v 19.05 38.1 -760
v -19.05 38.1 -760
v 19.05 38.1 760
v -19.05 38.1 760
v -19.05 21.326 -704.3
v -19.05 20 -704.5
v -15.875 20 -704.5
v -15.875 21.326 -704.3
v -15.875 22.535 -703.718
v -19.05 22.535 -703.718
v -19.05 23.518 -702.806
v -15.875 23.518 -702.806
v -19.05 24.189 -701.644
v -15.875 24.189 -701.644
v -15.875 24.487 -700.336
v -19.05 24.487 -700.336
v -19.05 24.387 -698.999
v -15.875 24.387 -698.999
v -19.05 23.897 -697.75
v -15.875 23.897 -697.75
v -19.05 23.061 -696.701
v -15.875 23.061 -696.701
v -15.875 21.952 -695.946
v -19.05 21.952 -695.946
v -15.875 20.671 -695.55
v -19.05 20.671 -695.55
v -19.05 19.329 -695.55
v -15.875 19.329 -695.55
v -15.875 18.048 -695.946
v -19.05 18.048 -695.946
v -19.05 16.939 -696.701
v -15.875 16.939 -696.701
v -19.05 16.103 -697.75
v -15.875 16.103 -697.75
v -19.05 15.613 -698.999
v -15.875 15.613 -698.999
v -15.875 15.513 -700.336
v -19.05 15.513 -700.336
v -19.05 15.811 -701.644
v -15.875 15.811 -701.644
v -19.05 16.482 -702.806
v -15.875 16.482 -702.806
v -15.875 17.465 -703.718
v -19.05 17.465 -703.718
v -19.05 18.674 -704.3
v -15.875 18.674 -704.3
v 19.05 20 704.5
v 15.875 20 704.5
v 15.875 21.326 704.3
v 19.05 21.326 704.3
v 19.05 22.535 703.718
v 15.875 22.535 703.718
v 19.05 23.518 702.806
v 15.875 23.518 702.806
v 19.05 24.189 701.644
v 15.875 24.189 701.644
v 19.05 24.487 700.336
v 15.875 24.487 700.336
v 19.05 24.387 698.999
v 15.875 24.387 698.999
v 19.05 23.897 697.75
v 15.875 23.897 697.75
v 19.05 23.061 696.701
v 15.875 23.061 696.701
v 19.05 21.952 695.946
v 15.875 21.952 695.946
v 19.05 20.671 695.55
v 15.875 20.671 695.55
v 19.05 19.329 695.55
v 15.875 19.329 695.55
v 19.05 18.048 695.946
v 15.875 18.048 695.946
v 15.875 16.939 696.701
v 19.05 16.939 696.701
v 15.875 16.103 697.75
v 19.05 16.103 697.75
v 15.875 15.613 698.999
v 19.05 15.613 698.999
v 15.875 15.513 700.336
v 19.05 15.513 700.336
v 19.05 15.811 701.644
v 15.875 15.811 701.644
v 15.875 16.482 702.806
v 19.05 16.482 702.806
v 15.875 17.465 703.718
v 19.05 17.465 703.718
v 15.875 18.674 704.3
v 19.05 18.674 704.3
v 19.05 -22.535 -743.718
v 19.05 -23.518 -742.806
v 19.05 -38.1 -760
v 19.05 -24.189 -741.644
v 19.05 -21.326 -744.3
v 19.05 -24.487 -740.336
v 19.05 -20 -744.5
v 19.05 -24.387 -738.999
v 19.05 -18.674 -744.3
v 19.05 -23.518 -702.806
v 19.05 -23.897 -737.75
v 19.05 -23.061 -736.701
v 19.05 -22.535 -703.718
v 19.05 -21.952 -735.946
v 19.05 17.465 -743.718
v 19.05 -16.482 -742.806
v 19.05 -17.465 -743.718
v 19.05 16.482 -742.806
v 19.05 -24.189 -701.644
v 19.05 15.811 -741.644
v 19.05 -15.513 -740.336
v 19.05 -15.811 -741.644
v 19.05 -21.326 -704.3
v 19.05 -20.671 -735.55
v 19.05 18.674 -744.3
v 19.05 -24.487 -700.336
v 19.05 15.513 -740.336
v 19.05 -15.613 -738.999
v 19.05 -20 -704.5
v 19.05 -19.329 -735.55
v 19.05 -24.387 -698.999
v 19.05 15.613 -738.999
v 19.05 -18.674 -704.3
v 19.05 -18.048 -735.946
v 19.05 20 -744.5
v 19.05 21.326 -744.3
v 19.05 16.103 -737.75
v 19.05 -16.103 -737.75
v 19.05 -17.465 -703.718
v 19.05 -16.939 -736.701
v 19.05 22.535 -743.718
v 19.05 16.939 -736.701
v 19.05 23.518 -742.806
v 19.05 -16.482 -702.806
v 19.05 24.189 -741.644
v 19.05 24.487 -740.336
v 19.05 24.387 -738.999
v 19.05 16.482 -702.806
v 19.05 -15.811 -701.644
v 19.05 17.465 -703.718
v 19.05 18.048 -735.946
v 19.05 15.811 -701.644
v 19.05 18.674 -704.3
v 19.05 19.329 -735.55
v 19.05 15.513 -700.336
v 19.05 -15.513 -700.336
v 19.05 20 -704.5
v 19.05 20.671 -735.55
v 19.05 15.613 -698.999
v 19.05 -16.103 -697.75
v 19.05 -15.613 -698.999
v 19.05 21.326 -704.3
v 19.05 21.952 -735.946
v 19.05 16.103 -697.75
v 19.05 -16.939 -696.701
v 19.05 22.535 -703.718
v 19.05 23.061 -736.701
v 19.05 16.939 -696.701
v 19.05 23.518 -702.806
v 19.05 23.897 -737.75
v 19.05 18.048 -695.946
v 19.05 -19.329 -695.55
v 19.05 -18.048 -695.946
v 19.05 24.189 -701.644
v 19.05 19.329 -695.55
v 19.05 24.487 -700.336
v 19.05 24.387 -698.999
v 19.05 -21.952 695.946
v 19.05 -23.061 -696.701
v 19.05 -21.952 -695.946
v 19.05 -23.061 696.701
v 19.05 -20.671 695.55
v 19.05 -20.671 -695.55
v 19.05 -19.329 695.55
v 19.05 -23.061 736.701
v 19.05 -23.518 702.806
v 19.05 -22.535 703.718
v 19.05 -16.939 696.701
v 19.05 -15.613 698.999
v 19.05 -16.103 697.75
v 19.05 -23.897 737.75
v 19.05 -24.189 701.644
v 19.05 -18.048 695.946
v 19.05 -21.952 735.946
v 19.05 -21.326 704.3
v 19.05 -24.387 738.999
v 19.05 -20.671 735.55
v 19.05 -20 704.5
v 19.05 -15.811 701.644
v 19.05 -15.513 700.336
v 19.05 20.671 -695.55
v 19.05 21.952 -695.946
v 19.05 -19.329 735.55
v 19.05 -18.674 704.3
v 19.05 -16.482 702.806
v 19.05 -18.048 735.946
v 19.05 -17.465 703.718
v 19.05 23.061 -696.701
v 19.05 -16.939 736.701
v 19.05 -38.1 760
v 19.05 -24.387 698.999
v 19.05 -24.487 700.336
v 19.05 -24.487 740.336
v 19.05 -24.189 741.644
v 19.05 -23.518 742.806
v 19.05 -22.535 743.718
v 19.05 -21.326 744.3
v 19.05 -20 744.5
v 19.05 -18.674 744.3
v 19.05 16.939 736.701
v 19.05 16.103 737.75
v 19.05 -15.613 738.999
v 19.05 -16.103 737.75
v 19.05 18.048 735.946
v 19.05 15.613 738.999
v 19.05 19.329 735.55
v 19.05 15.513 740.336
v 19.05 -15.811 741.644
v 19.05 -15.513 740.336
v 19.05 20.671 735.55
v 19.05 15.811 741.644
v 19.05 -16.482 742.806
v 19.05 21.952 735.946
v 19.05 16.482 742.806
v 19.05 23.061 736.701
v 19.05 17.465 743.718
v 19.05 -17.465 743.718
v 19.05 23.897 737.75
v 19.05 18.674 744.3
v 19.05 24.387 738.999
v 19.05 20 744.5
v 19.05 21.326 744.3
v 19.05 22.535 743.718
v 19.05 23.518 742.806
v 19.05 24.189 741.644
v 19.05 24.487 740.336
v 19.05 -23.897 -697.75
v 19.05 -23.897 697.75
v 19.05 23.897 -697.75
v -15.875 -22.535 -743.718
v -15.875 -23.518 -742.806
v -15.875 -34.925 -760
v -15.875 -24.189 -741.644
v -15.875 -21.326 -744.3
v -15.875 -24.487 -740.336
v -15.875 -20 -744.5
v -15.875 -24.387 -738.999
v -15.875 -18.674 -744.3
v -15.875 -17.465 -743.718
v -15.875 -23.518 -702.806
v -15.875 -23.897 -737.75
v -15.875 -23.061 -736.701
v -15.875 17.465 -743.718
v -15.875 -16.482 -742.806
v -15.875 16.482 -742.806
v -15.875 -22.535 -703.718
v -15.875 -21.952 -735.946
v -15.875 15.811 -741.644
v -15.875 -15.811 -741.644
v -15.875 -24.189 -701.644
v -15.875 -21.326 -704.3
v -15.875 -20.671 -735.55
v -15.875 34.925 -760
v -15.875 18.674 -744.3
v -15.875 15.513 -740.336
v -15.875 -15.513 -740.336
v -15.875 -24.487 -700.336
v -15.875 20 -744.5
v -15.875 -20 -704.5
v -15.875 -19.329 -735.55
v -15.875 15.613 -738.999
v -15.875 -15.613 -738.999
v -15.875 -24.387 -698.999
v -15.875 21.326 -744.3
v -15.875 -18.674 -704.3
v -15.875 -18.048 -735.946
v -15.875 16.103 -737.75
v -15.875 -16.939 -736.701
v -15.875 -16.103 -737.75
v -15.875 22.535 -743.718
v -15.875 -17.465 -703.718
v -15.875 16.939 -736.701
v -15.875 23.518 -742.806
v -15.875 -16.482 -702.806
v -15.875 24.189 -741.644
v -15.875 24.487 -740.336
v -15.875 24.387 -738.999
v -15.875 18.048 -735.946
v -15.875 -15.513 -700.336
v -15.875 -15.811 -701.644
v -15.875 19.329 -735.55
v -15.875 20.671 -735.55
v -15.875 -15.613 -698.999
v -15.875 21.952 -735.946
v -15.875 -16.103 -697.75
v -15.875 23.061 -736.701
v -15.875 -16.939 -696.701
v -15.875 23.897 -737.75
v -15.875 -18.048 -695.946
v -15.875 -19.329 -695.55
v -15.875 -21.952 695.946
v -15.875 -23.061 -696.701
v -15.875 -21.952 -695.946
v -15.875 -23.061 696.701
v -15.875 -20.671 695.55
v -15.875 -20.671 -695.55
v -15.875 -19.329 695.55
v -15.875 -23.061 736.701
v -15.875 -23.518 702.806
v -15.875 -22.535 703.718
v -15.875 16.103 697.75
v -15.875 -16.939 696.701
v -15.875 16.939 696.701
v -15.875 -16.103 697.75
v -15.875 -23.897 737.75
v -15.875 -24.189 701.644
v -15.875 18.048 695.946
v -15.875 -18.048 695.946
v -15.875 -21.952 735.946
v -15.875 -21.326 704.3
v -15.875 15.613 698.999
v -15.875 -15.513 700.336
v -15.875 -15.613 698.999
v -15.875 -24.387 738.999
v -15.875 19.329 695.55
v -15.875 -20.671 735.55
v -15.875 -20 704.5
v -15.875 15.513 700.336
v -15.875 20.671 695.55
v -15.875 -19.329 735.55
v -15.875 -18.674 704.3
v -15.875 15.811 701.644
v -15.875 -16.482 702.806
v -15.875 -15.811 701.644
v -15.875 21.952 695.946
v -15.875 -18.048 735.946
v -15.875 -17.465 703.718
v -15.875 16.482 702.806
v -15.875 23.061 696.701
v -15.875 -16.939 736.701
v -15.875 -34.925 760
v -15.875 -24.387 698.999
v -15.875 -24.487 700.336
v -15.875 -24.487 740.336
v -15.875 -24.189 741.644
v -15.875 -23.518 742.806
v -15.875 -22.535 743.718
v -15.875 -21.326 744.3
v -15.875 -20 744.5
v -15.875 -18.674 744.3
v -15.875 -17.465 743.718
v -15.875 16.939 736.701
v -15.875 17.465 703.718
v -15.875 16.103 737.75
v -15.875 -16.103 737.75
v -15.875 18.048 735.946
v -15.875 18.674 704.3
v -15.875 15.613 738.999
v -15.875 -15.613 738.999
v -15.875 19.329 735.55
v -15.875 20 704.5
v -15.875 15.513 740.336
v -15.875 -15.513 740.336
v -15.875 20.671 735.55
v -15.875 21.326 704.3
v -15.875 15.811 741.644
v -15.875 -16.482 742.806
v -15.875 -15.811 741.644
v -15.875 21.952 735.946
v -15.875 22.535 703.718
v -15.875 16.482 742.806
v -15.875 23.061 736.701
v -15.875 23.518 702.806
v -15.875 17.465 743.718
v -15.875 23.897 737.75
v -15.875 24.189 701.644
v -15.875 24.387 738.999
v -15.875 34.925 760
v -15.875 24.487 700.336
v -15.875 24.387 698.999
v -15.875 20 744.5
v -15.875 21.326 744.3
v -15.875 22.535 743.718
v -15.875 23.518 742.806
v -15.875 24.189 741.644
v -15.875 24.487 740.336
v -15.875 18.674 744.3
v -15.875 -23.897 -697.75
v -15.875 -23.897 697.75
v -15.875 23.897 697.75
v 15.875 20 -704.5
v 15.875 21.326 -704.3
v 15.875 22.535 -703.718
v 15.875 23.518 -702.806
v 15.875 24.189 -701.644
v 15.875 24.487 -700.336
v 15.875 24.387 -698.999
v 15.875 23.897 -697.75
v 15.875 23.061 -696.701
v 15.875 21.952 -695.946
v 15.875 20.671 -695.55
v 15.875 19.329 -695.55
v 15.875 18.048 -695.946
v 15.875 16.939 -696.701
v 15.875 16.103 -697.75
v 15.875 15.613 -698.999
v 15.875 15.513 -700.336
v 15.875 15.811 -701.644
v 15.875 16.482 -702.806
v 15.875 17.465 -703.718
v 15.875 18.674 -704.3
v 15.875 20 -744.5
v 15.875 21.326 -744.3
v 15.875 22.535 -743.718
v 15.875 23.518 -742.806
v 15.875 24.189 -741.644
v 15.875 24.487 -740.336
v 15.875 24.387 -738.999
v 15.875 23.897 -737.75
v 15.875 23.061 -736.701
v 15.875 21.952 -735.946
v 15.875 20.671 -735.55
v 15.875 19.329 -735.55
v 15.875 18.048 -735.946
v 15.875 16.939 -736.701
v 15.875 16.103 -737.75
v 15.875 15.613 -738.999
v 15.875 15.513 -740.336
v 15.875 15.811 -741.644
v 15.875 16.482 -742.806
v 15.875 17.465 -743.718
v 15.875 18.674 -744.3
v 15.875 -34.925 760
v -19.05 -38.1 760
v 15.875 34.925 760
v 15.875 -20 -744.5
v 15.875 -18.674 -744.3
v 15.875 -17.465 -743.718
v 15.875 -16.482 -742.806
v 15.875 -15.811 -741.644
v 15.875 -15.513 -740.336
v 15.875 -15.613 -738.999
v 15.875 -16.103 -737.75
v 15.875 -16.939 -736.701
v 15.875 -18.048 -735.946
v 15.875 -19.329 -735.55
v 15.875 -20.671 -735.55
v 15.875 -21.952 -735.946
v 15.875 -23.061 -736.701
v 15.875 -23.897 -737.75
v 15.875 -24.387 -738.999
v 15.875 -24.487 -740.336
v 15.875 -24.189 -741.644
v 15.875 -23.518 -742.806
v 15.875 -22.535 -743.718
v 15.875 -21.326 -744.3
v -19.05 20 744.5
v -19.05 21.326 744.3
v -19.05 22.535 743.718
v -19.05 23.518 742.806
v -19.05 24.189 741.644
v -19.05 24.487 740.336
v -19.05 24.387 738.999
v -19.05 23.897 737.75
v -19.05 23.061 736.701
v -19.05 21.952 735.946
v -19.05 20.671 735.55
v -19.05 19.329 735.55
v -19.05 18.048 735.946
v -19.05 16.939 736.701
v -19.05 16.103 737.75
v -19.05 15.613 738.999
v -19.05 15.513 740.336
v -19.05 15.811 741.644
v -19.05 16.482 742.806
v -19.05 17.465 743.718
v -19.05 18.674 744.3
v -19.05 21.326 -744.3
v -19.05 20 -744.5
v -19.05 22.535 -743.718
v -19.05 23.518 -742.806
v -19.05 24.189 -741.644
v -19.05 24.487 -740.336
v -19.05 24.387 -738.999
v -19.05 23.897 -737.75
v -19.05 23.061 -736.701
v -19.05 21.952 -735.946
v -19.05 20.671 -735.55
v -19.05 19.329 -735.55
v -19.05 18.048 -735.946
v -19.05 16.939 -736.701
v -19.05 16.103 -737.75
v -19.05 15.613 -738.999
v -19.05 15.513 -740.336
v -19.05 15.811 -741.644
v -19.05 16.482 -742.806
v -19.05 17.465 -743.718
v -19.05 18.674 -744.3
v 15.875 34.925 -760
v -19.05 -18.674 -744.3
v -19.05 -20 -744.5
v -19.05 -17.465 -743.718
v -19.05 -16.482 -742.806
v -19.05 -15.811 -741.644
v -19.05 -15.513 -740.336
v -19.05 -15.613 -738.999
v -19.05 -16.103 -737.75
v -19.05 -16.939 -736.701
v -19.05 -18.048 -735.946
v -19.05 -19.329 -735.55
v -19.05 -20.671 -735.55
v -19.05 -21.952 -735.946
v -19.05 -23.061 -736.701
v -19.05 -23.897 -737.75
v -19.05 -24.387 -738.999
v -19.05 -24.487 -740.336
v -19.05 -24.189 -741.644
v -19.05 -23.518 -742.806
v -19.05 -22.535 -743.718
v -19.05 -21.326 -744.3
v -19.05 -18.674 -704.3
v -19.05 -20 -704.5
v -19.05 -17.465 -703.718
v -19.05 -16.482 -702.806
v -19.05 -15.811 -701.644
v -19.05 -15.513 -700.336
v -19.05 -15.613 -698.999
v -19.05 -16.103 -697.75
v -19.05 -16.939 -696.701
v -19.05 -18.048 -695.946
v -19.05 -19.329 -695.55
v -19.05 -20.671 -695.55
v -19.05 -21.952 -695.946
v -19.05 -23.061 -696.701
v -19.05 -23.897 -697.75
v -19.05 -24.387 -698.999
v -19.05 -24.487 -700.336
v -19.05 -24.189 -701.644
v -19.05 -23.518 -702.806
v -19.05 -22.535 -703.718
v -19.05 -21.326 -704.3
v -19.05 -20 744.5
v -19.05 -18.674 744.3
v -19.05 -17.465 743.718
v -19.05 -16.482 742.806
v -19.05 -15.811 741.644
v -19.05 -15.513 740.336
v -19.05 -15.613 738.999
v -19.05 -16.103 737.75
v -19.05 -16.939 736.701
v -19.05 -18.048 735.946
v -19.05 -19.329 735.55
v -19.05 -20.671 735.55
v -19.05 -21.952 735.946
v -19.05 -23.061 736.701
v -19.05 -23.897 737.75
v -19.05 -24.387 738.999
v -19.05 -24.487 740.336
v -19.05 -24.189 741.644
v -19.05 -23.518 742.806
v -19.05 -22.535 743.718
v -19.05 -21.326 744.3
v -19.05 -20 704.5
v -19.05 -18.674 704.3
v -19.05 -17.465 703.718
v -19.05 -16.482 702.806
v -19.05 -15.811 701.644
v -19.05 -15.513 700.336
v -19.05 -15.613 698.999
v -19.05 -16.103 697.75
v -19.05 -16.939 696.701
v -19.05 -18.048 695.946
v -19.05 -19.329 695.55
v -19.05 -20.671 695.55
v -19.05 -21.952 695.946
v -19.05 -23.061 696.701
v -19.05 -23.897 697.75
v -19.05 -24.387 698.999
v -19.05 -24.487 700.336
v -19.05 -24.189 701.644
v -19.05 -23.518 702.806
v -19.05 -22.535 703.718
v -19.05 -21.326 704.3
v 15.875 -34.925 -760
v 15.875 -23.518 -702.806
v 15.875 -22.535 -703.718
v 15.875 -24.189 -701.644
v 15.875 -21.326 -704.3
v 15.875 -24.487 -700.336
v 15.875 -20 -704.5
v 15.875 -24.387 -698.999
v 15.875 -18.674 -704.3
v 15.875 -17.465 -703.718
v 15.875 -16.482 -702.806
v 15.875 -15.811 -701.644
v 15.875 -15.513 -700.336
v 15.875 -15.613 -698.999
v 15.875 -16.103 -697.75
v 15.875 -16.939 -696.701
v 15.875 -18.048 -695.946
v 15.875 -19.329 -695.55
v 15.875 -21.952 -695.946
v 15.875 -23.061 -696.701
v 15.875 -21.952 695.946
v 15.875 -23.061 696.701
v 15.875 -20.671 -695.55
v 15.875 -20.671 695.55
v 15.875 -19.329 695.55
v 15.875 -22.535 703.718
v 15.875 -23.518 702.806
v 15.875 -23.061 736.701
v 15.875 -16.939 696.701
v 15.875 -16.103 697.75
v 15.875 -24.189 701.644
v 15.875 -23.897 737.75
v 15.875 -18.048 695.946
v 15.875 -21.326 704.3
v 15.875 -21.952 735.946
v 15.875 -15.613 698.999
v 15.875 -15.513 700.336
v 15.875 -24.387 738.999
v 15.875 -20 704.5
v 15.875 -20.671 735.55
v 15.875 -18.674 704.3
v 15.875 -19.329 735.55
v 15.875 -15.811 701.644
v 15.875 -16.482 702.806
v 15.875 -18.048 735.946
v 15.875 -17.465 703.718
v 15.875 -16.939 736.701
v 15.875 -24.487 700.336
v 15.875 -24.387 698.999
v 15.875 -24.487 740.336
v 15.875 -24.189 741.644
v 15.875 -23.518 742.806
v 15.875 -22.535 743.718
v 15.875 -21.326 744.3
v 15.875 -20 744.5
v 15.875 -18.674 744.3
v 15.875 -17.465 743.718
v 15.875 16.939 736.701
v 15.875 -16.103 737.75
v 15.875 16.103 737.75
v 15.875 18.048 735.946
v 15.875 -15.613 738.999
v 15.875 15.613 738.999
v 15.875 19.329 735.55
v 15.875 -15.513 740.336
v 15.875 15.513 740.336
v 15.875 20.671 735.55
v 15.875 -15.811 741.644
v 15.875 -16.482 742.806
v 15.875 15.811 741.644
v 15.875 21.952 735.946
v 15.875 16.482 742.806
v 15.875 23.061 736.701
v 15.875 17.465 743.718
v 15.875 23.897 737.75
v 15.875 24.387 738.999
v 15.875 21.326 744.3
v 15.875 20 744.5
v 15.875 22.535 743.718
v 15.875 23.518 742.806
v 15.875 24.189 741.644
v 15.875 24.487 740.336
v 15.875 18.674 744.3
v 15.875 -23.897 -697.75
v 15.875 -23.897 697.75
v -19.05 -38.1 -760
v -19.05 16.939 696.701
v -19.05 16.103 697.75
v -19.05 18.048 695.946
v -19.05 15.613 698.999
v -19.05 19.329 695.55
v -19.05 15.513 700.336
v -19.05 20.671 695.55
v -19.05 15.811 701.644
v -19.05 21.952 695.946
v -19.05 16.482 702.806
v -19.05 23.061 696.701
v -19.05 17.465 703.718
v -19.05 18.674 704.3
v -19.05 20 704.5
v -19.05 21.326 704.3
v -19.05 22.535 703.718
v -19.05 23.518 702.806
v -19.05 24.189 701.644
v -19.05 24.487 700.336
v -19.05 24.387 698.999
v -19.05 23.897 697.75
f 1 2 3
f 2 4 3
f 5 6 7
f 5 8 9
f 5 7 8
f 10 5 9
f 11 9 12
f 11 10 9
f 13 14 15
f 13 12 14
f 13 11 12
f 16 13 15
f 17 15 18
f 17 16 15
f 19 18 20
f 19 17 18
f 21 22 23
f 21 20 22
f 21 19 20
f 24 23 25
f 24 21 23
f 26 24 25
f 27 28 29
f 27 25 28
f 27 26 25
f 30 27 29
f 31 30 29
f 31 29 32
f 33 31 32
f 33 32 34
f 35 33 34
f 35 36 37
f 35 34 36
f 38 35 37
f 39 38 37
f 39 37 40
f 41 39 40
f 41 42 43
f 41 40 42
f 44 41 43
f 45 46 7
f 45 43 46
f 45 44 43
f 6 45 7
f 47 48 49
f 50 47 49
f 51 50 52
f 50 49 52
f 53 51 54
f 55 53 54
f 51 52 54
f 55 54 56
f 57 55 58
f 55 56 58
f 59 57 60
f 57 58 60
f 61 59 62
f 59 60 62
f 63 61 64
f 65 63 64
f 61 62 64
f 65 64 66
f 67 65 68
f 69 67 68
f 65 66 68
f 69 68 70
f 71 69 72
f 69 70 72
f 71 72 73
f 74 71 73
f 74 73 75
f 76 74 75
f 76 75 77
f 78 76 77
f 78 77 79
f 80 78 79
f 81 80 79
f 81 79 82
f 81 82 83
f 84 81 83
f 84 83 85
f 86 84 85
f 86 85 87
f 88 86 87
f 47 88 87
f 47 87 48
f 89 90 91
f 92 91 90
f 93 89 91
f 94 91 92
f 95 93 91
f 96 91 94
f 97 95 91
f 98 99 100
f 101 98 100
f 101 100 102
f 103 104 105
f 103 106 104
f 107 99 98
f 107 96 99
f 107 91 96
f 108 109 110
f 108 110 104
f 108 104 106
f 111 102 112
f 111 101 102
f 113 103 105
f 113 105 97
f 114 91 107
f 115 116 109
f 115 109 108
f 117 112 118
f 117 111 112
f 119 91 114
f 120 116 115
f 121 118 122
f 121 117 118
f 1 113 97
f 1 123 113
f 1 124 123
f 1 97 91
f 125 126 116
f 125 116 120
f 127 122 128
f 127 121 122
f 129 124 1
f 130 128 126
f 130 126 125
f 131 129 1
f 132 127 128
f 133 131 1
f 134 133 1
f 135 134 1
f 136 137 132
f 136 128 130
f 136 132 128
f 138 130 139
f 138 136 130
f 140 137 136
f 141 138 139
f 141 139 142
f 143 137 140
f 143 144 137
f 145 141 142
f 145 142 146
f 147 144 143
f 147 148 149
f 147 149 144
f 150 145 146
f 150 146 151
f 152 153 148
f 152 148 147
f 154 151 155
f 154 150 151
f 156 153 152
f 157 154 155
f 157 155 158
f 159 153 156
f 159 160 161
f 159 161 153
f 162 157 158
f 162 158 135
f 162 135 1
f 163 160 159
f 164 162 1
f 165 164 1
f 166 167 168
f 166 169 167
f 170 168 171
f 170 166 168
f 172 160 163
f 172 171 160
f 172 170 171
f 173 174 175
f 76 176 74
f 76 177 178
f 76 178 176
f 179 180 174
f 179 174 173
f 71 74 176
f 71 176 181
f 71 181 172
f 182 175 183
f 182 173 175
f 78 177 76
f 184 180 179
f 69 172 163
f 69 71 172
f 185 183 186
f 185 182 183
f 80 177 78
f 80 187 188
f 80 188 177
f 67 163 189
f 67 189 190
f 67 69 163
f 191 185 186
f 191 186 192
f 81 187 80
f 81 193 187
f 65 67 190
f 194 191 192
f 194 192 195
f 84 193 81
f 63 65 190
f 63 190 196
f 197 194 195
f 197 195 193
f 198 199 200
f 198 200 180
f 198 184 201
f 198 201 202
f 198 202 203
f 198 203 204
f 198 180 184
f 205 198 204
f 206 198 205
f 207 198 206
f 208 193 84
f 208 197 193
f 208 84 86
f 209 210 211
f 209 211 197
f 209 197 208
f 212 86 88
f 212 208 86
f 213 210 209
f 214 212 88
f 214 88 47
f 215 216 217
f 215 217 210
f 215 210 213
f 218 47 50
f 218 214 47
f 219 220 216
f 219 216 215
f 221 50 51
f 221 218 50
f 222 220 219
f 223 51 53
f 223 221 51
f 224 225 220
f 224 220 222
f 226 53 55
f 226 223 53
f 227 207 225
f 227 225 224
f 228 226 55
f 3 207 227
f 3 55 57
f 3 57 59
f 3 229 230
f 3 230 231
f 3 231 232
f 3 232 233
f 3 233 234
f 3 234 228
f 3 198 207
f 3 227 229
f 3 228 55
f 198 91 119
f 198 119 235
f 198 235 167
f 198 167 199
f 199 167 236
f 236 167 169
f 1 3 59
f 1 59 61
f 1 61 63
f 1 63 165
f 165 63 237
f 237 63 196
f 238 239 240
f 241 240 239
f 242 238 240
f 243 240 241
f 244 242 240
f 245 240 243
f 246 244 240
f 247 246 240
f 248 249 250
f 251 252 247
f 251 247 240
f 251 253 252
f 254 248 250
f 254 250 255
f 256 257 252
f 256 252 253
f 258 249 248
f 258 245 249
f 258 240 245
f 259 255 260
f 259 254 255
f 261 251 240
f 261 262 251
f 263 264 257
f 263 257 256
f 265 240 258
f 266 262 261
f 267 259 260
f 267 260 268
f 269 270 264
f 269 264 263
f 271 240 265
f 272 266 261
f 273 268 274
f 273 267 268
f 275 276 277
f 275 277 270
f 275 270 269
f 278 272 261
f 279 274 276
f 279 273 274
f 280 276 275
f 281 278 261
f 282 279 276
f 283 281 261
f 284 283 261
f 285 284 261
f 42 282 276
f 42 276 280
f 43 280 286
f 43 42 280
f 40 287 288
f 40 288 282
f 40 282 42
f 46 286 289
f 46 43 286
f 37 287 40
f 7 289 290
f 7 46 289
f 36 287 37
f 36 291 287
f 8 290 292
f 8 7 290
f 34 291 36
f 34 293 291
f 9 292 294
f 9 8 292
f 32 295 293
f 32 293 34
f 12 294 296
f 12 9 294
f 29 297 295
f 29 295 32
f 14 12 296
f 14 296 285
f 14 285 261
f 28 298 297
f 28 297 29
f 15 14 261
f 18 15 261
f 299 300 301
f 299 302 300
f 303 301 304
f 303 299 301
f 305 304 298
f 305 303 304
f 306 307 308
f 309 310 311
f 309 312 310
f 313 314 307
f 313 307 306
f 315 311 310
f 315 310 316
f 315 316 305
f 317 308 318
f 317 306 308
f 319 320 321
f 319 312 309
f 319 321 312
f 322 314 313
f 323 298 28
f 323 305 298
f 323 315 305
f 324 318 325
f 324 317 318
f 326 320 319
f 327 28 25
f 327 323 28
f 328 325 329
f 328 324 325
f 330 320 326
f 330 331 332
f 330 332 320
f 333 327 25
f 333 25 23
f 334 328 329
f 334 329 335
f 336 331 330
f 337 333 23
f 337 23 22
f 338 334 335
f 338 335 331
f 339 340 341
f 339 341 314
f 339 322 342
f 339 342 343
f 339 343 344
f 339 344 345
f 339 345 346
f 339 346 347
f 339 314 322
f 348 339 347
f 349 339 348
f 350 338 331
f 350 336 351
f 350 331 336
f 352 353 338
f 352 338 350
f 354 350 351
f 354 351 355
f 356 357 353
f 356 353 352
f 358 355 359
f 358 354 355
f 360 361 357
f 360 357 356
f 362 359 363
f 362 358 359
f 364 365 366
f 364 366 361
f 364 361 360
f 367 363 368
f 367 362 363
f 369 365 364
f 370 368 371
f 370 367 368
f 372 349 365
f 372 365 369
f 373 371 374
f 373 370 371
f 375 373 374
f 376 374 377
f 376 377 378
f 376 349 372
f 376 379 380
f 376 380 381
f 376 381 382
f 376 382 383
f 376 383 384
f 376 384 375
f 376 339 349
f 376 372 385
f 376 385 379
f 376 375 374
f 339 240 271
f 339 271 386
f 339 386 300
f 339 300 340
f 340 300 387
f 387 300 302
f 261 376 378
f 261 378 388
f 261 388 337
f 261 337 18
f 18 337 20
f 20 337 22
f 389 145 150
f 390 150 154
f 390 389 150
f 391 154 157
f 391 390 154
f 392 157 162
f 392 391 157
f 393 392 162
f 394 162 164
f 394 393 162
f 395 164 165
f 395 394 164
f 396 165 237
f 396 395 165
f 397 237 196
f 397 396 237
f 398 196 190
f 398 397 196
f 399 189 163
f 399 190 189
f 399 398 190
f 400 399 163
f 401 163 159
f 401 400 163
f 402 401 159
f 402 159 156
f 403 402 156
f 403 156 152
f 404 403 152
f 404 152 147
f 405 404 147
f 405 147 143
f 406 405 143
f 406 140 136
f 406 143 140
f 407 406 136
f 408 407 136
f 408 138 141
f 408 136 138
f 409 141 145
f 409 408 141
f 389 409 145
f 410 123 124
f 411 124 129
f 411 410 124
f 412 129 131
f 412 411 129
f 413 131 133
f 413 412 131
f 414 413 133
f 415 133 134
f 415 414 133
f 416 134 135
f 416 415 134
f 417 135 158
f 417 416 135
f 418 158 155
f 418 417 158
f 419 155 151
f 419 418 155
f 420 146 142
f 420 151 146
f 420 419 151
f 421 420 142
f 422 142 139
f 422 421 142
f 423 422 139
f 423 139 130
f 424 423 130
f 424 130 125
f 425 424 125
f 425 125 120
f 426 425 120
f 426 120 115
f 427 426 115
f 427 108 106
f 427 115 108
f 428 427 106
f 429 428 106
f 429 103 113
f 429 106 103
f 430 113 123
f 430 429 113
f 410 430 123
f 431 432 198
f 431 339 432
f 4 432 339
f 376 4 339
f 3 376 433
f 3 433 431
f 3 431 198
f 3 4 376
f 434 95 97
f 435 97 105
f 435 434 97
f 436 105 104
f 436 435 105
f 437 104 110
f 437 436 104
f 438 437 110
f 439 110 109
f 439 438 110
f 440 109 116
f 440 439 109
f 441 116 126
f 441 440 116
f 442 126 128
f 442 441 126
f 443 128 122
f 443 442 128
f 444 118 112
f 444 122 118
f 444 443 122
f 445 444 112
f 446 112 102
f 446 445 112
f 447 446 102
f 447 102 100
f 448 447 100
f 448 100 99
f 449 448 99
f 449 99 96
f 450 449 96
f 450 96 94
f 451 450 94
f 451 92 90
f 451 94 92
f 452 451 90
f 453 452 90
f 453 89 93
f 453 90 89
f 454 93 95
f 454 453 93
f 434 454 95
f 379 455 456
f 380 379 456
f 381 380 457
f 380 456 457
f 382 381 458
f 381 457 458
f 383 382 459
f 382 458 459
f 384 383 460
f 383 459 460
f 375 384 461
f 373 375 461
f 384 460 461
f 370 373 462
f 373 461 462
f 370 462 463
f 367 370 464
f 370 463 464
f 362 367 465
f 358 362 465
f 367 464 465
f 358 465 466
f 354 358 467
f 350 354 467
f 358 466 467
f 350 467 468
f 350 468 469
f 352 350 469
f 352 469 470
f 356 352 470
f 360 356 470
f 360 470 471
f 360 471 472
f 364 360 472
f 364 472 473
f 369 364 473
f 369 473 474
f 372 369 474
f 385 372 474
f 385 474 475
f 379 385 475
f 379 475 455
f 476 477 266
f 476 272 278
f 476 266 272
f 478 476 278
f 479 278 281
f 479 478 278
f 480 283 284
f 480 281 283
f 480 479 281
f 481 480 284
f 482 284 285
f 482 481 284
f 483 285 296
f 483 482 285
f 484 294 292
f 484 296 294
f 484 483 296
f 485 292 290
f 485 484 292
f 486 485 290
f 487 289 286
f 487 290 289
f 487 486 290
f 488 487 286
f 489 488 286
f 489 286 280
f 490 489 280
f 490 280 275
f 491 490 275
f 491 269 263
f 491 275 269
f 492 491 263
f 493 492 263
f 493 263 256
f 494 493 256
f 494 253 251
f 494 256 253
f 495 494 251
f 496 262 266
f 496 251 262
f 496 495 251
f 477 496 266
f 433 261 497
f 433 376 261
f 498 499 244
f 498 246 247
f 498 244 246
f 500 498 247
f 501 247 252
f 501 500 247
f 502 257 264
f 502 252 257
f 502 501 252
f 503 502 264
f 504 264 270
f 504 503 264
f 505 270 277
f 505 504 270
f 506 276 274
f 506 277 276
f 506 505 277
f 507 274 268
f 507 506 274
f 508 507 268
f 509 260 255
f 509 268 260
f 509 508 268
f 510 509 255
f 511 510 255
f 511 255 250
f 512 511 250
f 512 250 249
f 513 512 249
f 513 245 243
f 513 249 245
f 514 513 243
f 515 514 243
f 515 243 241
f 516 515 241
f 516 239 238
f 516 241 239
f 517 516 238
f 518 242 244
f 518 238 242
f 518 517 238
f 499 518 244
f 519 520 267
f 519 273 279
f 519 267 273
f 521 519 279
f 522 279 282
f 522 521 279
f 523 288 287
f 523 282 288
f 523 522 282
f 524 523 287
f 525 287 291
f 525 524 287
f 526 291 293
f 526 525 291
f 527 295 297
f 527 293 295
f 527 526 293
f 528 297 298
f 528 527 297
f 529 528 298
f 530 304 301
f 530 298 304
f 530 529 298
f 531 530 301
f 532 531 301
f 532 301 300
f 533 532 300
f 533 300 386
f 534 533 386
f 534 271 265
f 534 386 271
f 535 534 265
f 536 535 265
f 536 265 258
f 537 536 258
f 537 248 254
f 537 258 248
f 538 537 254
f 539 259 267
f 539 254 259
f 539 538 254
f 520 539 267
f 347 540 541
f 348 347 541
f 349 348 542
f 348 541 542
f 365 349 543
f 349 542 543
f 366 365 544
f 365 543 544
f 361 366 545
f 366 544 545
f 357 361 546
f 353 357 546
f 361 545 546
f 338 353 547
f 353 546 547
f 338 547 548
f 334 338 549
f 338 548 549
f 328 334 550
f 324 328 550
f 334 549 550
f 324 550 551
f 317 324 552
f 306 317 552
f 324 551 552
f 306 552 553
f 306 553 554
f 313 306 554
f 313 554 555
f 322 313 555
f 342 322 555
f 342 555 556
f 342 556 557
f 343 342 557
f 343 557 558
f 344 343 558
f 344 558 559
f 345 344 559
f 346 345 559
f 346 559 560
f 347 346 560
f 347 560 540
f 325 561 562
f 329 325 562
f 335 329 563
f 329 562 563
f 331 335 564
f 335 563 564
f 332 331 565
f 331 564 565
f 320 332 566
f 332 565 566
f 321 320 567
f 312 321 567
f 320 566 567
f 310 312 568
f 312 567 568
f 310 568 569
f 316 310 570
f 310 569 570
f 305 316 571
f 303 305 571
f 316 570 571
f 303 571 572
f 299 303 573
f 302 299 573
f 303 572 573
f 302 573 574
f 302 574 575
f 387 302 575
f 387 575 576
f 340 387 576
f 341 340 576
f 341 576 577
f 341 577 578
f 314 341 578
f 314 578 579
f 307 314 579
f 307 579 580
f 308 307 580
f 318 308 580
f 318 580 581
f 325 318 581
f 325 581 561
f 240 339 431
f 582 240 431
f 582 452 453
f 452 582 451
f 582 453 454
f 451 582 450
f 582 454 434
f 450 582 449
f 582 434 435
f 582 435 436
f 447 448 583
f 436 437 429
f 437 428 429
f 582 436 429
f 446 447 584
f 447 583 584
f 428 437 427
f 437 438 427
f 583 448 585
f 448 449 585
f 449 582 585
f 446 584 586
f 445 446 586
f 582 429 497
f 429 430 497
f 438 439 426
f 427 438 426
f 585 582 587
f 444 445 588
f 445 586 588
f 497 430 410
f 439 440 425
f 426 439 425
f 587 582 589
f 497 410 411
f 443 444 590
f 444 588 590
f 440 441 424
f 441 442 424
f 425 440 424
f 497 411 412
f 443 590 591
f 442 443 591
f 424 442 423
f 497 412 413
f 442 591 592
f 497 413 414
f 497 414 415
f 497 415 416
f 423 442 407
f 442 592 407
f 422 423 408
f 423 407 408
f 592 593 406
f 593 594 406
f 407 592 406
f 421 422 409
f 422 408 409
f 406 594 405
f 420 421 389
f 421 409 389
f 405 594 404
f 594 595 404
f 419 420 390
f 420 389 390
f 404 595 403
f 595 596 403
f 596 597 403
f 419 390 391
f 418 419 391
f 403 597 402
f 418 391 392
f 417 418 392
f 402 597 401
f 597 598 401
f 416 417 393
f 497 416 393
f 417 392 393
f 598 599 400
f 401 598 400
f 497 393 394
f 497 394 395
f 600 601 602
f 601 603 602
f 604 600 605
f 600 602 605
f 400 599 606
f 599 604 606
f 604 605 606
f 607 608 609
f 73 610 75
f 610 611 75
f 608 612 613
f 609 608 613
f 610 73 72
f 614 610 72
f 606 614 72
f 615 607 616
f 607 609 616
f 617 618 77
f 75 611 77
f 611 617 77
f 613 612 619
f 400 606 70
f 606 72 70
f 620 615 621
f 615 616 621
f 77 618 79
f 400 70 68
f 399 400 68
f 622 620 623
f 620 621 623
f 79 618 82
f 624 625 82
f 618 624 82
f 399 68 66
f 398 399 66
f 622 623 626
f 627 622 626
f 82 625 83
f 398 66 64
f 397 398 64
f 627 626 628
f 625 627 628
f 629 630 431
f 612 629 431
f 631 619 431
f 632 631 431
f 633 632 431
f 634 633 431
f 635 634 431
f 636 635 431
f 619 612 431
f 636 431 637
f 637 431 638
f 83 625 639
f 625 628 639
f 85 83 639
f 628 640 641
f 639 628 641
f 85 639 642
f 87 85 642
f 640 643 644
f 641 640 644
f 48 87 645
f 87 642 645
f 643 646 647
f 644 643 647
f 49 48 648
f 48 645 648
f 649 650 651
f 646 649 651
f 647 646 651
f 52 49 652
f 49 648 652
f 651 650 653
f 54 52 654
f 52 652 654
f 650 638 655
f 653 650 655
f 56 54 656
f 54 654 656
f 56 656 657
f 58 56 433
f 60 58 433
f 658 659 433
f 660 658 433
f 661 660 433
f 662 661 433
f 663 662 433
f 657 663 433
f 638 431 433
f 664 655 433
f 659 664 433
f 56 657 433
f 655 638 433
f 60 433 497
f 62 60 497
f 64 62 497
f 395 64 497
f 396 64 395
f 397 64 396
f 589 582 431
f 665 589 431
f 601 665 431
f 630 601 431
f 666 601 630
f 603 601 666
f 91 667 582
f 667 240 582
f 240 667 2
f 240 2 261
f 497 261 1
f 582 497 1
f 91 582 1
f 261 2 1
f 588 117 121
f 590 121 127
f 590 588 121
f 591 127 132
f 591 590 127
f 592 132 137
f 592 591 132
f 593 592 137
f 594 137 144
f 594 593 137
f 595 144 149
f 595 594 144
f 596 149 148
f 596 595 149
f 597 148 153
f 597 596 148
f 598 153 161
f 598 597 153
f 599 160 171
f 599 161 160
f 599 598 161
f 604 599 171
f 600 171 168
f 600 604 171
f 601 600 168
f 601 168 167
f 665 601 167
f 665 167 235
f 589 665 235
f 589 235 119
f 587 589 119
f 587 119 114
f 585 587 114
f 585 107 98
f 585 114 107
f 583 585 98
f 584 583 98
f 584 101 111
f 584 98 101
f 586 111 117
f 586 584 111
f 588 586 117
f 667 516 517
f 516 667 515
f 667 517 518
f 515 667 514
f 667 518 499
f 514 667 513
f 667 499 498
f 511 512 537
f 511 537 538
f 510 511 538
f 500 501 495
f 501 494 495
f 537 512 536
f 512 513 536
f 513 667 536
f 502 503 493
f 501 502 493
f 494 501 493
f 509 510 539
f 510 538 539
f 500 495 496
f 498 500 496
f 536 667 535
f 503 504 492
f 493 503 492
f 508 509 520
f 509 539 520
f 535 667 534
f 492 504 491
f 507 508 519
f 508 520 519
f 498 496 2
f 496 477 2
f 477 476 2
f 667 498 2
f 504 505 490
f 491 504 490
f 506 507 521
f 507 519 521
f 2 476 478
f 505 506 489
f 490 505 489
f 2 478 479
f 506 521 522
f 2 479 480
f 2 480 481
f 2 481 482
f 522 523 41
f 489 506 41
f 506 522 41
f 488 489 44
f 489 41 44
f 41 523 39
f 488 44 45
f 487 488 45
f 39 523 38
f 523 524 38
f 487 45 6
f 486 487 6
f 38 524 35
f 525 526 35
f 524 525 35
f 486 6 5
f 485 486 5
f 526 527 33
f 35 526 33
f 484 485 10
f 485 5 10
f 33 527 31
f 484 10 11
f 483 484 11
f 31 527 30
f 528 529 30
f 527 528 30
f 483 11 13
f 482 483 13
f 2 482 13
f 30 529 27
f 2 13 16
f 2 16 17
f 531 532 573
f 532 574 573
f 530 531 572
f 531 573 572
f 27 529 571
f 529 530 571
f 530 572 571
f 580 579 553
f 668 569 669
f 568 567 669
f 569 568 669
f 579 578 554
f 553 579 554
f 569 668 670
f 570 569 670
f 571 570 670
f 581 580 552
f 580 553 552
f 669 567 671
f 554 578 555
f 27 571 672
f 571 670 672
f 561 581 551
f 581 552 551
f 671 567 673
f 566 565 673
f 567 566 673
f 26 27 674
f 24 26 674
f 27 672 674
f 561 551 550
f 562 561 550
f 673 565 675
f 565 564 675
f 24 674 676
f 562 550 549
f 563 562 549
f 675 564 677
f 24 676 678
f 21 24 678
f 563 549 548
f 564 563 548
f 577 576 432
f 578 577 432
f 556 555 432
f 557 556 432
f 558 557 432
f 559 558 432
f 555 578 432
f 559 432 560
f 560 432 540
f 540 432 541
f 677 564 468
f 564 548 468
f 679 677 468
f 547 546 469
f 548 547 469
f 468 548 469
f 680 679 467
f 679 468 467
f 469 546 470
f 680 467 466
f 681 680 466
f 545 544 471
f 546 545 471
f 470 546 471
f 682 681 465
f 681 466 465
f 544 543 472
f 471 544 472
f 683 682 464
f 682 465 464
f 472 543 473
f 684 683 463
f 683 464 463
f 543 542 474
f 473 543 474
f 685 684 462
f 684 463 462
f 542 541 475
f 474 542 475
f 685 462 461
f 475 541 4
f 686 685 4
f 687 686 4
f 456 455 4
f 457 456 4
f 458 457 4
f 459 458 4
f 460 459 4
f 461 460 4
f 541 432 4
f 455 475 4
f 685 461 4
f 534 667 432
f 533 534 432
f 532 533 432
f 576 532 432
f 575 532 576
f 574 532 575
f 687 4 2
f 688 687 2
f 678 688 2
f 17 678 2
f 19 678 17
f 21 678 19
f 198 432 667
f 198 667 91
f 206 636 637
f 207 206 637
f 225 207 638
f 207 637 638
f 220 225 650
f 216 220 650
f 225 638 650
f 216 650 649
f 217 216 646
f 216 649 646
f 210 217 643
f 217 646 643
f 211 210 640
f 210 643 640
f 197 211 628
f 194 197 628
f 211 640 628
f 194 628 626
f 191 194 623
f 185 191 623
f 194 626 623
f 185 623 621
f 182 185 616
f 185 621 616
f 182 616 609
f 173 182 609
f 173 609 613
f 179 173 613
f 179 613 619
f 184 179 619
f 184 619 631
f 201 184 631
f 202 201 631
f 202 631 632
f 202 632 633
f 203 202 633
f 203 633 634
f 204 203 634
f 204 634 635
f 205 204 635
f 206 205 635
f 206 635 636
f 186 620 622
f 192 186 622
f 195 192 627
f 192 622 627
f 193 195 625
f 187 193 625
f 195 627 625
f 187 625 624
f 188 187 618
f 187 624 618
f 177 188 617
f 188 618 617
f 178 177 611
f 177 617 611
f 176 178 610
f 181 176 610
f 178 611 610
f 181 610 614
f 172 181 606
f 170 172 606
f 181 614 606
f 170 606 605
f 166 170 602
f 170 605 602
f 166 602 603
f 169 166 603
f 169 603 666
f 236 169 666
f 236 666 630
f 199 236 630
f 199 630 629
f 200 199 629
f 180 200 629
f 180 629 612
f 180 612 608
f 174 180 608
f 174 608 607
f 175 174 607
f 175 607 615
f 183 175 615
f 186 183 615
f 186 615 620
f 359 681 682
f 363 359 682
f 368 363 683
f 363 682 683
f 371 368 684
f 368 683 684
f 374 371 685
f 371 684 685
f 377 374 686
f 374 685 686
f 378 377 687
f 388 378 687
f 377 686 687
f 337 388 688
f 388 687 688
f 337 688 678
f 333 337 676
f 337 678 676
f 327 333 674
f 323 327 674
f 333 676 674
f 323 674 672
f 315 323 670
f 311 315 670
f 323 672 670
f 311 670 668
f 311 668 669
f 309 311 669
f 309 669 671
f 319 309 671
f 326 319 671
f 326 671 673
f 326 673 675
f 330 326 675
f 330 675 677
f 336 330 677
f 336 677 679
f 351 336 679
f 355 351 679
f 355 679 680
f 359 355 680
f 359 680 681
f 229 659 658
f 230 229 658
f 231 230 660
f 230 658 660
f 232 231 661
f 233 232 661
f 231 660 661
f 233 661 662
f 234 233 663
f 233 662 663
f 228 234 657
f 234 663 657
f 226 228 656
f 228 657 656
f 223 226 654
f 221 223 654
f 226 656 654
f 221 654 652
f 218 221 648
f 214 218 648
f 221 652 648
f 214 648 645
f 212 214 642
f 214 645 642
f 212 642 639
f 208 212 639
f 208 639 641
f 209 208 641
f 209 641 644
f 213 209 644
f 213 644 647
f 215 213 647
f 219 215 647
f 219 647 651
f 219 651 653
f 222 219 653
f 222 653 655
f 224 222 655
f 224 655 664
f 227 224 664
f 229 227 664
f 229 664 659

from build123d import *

# Parameters (mm, degrees)
SKETCH1_W                = 38.1
SKETCH1_H                = 76.2
SKETCH1_W_2              = 31.75
SKETCH1_H_2              = 69.85
EXTRUDE_THIN1_DEPTH      = 760
M8_CLEARANCE_HOLE2_D     = 9
M8_CLEARANCE_HOLE2_DEPTH = 3.175
M8_CLEARANCE_HOLE1_D     = 9


with BuildPart() as part:
    # Sketch1 → Extrude-Thin1 (new, symmetric)
    with BuildSketch(Plane.XY):
        Rectangle(SKETCH1_W, SKETCH1_H)
        Rectangle(SKETCH1_W_2, SKETCH1_H_2, mode=Mode.SUBTRACT)
    extrude(amount=EXTRUDE_THIN1_DEPTH, both=True)

    # M8 Clearance Hole2
    with Locations(Plane(origin=(19.05, 0, 0), x_dir=(0, 0, -1), z_dir=(1, 0, 0))):
        with Locations((-740, 20), (-740, -20), (-700, 20), (-700, -20)):
            m8_clearance_hole2 = Hole(M8_CLEARANCE_HOLE2_D / 2, depth=M8_CLEARANCE_HOLE2_DEPTH)

    # M8 Clearance Hole1 (through all)
    with Locations(Plane(origin=(-15.875, 0, 0), x_dir=(0, 0, -1), z_dir=(1, 0, 0))):
        with Locations((-740, 20), (-740, -20), (-700, 20), (-700, -20)):
            m8_clearance_hole1 = Hole(M8_CLEARANCE_HOLE1_D / 2)

    # Mirror1: M8 Clearance Hole2, M8 Clearance Hole1 across plane
    add(m8_clearance_hole2.mirror(Plane.XY), mode=Mode.SUBTRACT)
    add(m8_clearance_hole1.mirror(Plane.XY), mode=Mode.SUBTRACT)


solid = part.part
